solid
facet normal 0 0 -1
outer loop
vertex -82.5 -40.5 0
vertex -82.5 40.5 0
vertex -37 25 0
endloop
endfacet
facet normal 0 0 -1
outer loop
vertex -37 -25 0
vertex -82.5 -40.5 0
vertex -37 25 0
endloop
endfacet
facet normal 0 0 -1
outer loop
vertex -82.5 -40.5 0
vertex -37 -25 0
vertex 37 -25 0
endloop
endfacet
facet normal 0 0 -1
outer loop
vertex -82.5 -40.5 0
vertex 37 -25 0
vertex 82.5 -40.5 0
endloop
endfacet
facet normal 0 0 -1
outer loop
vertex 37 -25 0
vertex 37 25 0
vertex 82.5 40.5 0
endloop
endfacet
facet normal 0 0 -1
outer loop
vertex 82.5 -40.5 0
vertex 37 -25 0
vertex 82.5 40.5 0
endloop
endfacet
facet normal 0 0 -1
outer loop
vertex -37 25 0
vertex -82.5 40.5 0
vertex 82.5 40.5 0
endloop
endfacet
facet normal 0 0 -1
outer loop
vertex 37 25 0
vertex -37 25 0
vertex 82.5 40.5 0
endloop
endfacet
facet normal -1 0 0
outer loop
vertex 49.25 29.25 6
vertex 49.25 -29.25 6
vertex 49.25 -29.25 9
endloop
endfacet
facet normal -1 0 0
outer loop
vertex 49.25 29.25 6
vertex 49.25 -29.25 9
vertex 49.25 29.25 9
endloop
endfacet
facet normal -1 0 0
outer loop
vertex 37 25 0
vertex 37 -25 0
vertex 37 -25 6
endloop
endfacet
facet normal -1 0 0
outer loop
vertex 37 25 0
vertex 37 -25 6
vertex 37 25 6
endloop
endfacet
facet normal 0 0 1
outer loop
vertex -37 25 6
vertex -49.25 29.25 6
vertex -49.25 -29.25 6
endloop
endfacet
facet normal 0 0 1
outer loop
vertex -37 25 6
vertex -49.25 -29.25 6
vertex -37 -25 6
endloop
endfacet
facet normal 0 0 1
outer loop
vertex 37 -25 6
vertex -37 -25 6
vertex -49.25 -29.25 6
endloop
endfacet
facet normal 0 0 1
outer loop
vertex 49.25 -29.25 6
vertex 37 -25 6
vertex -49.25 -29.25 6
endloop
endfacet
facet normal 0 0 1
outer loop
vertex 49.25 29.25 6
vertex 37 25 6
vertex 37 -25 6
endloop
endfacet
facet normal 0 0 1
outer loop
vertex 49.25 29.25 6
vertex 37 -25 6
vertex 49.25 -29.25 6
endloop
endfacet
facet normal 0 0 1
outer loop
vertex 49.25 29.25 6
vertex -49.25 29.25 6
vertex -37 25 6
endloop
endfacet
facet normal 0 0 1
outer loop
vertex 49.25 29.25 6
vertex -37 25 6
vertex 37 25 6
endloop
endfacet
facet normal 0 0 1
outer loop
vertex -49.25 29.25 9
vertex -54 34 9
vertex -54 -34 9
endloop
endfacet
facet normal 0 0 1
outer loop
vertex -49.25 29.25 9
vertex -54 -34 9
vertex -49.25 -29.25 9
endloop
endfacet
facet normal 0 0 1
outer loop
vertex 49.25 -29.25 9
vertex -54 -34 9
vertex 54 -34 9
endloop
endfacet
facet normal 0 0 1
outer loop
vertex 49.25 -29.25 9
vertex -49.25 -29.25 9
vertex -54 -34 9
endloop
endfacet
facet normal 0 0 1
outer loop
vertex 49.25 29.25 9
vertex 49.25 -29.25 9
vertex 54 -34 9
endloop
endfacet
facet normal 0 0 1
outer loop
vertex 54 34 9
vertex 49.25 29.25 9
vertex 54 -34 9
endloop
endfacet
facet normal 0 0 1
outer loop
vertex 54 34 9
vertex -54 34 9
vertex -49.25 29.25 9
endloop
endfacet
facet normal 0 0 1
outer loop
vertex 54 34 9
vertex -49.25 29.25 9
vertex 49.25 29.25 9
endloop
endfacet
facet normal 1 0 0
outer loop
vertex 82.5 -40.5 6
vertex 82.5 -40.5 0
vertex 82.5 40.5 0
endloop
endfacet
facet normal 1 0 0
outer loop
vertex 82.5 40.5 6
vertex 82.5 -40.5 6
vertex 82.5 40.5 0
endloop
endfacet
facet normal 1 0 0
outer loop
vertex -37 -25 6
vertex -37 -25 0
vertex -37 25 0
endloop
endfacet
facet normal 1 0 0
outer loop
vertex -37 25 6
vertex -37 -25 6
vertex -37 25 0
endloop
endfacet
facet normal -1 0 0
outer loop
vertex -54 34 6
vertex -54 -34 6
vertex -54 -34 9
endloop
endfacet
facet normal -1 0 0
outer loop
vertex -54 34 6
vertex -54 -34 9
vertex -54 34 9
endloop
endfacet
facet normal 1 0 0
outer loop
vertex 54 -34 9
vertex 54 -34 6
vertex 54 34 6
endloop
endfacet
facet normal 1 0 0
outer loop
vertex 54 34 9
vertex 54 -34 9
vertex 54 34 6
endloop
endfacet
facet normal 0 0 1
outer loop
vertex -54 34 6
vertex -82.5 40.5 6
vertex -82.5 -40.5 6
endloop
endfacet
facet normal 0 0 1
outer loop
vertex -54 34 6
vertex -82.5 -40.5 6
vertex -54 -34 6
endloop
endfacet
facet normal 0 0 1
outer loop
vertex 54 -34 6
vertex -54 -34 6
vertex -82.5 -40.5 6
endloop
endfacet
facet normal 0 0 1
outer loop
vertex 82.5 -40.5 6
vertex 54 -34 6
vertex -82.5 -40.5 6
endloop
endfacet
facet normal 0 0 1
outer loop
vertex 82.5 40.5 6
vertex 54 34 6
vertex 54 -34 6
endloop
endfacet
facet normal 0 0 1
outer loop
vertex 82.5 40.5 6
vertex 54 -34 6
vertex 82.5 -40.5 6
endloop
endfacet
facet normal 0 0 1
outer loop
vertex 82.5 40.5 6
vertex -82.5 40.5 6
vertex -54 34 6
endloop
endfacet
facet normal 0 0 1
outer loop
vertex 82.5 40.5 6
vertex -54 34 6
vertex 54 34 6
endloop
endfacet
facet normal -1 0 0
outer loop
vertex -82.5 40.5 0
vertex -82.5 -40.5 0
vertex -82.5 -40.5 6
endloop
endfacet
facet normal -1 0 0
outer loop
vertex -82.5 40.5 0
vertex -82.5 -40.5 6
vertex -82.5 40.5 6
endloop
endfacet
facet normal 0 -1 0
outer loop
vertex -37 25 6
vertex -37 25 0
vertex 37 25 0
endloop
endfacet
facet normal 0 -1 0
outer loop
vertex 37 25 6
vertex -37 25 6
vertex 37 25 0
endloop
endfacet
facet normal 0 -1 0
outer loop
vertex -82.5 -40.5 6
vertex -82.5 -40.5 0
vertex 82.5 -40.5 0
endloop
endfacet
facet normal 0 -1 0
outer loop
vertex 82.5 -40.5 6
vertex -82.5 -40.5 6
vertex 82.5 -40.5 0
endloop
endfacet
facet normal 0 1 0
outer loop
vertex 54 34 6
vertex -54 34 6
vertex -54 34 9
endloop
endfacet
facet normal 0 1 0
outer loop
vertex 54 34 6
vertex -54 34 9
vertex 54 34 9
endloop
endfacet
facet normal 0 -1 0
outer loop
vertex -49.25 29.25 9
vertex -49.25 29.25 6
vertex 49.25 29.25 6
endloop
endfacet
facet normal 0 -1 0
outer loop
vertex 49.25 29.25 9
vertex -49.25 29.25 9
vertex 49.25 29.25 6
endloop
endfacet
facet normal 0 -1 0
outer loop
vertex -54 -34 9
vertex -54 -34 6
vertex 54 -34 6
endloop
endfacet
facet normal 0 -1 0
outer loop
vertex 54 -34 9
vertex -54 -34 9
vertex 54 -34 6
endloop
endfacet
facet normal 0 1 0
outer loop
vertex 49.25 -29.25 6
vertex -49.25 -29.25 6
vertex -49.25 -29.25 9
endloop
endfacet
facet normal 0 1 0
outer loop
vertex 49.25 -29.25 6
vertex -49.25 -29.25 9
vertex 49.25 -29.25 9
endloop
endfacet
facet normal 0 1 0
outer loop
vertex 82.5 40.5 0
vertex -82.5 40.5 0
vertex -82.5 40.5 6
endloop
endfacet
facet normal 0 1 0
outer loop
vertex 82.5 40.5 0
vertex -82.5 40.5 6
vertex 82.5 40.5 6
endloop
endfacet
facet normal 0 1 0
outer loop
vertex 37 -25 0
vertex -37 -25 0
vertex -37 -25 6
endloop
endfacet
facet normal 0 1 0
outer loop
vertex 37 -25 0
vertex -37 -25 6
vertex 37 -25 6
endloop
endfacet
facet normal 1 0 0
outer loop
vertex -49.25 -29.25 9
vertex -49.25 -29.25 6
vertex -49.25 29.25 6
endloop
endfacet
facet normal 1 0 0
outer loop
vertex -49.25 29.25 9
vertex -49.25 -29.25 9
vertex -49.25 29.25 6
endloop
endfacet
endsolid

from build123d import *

# Parameters (mm, degrees)
SKETCH1_W           = 165
SKETCH1_H           = 81
SKETCH1_W_2         = 74
SKETCH1_H_2         = 50
BOSS_EXTRUDE1_DEPTH = 6
SKETCH2_W           = 108
SKETCH2_H           = 68
SKETCH2_W_2         = 98.5
SKETCH2_H_2         = 58.5
BOSS_EXTRUDE2_DEPTH = 9


with BuildPart() as part:
    # Sketch1 → Boss-Extrude1 (new body)
    with BuildSketch(Plane.XY):
        Rectangle(SKETCH1_W, SKETCH1_H)
        Rectangle(SKETCH1_W_2, SKETCH1_H_2, mode=Mode.SUBTRACT)
    extrude(amount=BOSS_EXTRUDE1_DEPTH)

    # Sketch2 → Boss-Extrude2 (add)
    with BuildSketch(Plane.XY):
        Rectangle(SKETCH2_W, SKETCH2_H)
        Rectangle(SKETCH2_W_2, SKETCH2_H_2, mode=Mode.SUBTRACT)
    extrude(amount=BOSS_EXTRUDE2_DEPTH)


solid = part.part
